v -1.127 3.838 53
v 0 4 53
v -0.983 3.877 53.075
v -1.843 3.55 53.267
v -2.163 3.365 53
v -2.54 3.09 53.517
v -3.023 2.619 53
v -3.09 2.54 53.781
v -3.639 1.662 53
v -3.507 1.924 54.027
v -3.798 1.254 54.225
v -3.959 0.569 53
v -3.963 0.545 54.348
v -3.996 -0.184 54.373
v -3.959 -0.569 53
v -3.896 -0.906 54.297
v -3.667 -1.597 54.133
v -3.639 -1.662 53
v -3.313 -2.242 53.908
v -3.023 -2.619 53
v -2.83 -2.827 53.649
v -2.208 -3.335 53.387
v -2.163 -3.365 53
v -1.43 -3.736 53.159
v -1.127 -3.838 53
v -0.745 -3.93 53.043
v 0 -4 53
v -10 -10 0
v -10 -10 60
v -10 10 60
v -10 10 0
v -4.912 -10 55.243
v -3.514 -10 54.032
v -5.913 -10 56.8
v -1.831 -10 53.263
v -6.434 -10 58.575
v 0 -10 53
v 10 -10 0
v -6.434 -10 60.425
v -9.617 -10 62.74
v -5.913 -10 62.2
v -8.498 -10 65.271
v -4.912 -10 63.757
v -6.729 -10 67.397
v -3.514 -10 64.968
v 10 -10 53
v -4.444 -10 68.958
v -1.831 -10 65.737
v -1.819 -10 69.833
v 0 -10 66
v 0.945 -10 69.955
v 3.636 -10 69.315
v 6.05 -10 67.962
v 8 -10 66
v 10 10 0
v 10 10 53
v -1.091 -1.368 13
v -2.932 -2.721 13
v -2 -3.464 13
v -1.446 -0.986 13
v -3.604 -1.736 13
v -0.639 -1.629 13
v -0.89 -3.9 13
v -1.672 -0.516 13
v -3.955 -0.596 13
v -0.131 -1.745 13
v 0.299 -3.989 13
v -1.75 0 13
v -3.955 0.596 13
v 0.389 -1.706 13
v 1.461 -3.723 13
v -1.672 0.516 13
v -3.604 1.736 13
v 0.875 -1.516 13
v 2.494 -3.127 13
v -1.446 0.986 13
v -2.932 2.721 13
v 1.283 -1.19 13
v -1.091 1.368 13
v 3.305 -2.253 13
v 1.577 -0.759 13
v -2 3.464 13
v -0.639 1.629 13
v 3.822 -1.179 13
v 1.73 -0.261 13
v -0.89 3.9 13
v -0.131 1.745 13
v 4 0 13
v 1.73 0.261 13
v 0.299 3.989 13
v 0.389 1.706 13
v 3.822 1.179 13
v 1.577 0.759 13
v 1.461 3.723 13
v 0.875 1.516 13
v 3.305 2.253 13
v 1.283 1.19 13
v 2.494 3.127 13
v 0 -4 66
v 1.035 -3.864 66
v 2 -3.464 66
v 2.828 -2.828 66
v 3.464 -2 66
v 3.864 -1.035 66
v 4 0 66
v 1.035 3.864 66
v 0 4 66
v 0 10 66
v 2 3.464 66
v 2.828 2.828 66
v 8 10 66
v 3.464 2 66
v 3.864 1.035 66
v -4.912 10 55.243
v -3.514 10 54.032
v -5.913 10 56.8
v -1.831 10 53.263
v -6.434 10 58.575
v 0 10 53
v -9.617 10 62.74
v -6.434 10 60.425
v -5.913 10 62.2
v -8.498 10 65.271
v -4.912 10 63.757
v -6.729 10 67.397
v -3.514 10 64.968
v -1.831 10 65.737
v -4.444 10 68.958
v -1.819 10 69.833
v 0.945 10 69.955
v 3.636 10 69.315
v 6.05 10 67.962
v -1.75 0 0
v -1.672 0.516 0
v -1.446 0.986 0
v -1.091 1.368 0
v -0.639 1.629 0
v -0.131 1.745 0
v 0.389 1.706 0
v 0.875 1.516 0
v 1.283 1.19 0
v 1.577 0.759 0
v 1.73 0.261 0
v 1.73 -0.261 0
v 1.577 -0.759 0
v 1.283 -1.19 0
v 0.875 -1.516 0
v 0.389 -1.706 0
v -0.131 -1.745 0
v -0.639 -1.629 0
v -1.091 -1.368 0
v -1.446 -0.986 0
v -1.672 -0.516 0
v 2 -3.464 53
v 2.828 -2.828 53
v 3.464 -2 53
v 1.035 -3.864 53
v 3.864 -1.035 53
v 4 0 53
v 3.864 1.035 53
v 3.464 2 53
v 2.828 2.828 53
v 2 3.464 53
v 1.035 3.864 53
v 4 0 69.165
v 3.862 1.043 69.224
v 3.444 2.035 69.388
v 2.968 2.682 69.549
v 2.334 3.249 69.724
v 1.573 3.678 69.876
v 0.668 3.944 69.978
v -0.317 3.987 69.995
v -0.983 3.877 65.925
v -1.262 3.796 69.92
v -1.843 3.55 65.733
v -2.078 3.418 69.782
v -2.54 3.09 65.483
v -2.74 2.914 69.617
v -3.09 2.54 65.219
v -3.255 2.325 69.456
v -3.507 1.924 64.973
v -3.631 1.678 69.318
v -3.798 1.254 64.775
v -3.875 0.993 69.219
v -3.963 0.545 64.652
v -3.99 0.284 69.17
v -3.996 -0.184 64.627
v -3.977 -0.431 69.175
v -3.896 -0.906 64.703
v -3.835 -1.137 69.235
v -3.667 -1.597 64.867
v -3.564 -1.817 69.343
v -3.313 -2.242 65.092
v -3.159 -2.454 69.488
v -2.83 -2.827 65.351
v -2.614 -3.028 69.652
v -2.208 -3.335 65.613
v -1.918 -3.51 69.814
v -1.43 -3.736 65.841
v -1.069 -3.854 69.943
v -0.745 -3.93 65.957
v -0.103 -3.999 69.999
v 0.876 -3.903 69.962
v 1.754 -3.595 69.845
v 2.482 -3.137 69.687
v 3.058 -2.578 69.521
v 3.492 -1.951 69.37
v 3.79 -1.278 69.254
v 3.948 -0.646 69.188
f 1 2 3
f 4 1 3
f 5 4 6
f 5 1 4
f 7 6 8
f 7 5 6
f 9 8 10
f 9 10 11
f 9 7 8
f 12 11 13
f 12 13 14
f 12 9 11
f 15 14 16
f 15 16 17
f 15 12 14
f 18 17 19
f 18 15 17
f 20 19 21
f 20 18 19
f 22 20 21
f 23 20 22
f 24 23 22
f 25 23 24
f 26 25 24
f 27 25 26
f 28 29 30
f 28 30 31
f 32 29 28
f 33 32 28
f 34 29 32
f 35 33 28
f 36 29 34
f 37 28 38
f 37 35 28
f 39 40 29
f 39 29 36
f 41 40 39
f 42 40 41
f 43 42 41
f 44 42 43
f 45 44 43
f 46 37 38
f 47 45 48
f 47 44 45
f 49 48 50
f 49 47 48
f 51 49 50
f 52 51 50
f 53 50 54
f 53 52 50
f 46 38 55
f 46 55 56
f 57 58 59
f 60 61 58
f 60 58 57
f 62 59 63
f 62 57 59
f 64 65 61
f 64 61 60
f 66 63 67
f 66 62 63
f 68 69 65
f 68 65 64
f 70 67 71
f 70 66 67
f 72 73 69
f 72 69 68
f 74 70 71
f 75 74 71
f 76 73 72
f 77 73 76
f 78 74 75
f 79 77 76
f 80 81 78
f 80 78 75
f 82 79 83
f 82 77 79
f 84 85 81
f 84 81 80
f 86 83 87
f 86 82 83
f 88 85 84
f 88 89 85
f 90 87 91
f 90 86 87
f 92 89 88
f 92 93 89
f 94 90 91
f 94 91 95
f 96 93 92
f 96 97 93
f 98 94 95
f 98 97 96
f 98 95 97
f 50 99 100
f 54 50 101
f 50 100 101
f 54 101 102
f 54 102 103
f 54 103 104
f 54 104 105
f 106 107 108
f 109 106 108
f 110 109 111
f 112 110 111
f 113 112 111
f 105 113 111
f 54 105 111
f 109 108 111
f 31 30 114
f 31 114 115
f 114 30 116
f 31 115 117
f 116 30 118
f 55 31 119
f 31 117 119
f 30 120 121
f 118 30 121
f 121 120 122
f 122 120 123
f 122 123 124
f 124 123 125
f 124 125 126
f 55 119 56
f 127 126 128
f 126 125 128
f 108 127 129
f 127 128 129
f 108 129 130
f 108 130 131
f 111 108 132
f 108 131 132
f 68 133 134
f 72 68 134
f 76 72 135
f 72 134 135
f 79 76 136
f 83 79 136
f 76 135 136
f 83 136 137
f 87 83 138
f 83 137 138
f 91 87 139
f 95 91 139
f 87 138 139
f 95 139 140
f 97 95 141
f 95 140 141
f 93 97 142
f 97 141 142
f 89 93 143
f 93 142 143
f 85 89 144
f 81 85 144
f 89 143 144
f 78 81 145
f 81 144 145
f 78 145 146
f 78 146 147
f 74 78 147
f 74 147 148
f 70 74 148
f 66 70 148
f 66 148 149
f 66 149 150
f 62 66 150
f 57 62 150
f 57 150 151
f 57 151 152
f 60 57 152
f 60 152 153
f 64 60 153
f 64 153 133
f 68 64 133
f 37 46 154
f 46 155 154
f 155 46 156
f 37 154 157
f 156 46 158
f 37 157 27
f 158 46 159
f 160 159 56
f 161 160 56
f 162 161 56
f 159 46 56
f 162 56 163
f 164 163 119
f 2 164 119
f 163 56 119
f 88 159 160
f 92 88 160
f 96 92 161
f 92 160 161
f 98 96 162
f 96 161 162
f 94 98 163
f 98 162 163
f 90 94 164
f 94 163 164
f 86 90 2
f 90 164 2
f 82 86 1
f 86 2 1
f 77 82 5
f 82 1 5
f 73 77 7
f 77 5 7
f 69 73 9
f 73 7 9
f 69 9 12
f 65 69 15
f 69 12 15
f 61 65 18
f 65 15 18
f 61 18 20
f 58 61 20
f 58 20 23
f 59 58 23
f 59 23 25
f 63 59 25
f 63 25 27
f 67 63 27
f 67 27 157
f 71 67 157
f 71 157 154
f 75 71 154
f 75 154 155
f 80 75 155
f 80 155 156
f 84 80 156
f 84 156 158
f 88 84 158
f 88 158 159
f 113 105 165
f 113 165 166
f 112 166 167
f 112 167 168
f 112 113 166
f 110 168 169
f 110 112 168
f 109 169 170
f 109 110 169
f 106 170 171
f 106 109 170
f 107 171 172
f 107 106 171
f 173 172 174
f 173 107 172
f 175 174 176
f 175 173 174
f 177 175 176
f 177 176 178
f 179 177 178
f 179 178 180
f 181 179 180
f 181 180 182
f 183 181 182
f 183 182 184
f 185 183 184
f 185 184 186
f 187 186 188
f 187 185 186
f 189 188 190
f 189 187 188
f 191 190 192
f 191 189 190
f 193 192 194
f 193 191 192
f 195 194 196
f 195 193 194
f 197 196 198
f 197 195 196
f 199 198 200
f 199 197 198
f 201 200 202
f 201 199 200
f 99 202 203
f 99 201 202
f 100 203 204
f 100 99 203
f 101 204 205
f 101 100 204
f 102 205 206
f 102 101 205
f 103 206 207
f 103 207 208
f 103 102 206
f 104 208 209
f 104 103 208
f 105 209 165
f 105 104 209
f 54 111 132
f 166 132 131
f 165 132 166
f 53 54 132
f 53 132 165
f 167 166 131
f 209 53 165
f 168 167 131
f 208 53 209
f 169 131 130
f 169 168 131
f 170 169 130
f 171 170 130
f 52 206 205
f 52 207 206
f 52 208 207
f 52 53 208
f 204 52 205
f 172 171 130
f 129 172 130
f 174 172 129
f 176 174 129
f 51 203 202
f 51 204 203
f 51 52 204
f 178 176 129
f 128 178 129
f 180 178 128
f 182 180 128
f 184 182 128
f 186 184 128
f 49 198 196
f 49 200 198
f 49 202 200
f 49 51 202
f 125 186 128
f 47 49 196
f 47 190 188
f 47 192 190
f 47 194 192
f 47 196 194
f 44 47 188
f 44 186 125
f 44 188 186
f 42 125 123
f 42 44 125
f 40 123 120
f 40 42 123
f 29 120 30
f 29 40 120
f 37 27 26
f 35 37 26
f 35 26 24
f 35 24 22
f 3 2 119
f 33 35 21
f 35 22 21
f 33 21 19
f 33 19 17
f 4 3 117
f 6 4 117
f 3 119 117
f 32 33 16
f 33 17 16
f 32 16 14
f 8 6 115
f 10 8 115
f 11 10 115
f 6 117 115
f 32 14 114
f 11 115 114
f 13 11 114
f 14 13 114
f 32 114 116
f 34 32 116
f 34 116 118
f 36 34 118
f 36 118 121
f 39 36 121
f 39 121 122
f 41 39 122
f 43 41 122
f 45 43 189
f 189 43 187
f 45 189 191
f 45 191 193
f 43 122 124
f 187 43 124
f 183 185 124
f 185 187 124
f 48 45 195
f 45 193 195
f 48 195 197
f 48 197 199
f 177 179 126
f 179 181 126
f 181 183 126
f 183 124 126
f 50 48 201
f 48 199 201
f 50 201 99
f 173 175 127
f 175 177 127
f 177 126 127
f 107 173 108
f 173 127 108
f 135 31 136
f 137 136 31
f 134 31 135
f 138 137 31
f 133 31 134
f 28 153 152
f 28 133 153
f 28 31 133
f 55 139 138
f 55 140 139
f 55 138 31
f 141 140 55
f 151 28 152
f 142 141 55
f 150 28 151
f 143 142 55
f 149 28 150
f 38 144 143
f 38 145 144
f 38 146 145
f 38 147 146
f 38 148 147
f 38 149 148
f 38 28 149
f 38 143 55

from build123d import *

# Parameters (mm, degrees)
F1_DEPTH      = 10
F1_DEPTH_BACK = 10
F3_DEPTH      = 20
F4_R          = 4
F5_DEPTH      = 40
F5_DEPTH_BACK = 18.0000001001
F7_D          = 3.5


with BuildPart() as f1:
    # F0 (on Front) → F1 (new body, two sides)
    with BuildSketch(Plane.XZ) as f1_sk:
        with BuildLine():
            ThreePointArc((10, 60), (0, 70), (-10, 60))
            Line((-10, 60), (-10, 0))
            Line((-10, 0), (10, 0))
            Line((10, 0), (10, 60))
        make_face()
    extrude(amount=F1_DEPTH)
    extrude(f1_sk.sketch, amount=-F1_DEPTH_BACK)

    # F2 (on face) → F3 (cut, through all)
    with BuildSketch(Plane(origin=(0, 10, 0), x_dir=(-1, 0, 0), z_dir=(0, 1, 0))):
        with BuildLine():
            Line((-10, 53), (0, 53))
            ThreePointArc((0, 53), (6.5, 59.5), (0, 66))
            Line((0, 66), (-8, 66))
            ThreePointArc((-8, 66), (-9.4868329805, 63.1622776602), (-10, 60))
            Line((-10, 60), (-10, 53))
        make_face()
    extrude(amount=-F3_DEPTH, mode=Mode.SUBTRACT)

    # F4 (on face) → F5 (cut, two sides)
    with BuildSketch(Plane.XY.offset(53)) as f5_sk:
        Circle(F4_R)
    extrude(amount=-F5_DEPTH, mode=Mode.SUBTRACT)
    extrude(f5_sk.sketch, amount=F5_DEPTH_BACK, mode=Mode.SUBTRACT)

    # F7 (through all)
    with Locations(Plane.XY.offset(13)):
        with Locations((0, 0)):
            Hole(F7_D / 2)


solid = f1.part
